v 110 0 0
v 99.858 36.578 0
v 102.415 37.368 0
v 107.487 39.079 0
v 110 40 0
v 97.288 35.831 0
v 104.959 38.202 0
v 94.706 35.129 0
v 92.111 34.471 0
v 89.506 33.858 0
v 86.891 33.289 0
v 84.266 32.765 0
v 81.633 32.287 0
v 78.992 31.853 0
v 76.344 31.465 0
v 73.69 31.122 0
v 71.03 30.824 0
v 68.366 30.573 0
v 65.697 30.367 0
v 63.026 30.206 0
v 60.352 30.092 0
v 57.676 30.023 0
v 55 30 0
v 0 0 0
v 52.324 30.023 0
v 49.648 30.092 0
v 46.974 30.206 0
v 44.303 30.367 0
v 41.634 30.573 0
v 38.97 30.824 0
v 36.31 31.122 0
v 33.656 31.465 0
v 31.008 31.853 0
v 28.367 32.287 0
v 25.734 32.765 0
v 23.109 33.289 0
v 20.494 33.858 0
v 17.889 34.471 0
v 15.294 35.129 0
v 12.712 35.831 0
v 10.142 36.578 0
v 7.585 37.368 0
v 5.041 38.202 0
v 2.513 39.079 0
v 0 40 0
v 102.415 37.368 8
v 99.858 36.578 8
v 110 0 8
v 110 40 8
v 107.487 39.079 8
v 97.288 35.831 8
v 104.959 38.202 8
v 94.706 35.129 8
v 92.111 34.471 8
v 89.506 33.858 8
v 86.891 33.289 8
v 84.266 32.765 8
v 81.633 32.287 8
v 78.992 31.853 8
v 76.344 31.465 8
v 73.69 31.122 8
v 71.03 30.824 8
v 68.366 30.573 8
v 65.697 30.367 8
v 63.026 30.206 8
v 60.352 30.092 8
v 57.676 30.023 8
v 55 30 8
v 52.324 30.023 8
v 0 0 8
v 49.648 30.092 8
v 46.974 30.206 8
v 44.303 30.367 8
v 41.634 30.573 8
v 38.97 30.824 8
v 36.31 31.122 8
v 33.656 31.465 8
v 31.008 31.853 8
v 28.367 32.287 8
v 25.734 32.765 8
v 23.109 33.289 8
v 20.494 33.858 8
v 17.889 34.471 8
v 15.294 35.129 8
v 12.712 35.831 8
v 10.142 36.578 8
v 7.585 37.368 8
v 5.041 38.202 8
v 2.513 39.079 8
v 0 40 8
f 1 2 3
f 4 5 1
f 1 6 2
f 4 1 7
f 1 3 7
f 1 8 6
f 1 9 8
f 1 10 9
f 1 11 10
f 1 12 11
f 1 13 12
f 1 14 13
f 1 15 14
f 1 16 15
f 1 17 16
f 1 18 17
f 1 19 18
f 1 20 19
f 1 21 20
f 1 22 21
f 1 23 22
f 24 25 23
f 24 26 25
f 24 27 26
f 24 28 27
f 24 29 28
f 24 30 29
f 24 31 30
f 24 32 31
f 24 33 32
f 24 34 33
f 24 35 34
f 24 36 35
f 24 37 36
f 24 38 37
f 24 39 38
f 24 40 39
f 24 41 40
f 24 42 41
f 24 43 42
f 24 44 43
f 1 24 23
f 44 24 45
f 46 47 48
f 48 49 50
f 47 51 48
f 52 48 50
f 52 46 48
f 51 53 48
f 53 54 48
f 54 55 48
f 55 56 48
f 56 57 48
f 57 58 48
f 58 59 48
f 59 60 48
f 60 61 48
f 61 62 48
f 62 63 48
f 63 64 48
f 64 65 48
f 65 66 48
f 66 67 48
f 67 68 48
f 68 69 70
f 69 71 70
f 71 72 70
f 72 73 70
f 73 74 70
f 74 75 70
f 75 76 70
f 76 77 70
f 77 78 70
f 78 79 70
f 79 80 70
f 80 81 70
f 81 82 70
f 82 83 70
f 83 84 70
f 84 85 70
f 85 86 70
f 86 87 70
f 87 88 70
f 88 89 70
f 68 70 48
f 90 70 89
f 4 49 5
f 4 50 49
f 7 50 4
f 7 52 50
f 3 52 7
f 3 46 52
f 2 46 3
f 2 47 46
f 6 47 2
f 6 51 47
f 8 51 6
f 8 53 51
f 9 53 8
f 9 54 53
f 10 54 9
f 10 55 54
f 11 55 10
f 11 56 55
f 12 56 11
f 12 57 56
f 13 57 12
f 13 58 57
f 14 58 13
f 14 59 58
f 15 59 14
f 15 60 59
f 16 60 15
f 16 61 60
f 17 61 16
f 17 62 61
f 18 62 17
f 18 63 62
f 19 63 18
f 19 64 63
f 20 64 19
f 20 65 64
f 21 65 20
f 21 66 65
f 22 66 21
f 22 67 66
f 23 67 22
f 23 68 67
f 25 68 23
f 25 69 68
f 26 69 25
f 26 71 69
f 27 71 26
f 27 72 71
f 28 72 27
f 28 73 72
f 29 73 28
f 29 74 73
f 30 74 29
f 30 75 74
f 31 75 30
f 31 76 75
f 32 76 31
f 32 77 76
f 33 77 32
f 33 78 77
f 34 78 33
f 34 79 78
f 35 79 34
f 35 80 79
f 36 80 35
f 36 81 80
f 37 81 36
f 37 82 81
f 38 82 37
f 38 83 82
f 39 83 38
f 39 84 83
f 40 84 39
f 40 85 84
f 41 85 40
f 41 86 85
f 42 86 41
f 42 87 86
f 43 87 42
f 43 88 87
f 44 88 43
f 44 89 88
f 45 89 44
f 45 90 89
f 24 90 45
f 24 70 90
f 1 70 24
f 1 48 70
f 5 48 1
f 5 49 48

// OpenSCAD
$fn = 32;

// ----------------------------------------------------------------------
// Arc profile plate: notch, 45 points
// ----------------------------------------------------------------------

// --- parameters (mm) ---
bar_l = 110;              // bar length, X
bar_w = 40;               // bar width, Y
notch_depth = 10;         // depth of the arc notch at mid-span
arc_r = 156.25;           // radius of the notch arc
arc_angle = 41.22;        // notch arc angle, degrees
arc_step = 1;             // sampling step of the notch arc, degrees
plate_t = 8;              // plate thickness, Z

profile = [[0, 0], [110, 0], [110, 40], [107.487, 39.079], [104.959, 38.202], [102.415, 37.368], [99.858, 36.578], [97.288, 35.831], [94.706, 35.129], [92.111, 34.471], [89.506, 33.858], [86.891, 33.289], [84.266, 32.765], [81.633, 32.287], [78.992, 31.853], [76.344, 31.465], [73.69, 31.122], [71.03, 30.824], [68.366, 30.573], [65.697, 30.367], [63.026, 30.206], [60.352, 30.092], [57.676, 30.023], [55, 30], [52.324, 30.023], [49.648, 30.092], [46.974, 30.206], [44.303, 30.367], [41.634, 30.573], [38.97, 30.824], [36.31, 31.122], [33.656, 31.465], [31.008, 31.853], [28.367, 32.287], [25.734, 32.765], [23.109, 33.289], [20.494, 33.858], [17.889, 34.471], [15.294, 35.129], [12.712, 35.831], [10.142, 36.578], [7.585, 37.368], [5.041, 38.202], [2.513, 39.079], [0, 40]];  // primary outline, 45 points, counter clockwise

// --- the one profile operation ---
linear_extrude(height = plate_t) polygon(points = profile);
